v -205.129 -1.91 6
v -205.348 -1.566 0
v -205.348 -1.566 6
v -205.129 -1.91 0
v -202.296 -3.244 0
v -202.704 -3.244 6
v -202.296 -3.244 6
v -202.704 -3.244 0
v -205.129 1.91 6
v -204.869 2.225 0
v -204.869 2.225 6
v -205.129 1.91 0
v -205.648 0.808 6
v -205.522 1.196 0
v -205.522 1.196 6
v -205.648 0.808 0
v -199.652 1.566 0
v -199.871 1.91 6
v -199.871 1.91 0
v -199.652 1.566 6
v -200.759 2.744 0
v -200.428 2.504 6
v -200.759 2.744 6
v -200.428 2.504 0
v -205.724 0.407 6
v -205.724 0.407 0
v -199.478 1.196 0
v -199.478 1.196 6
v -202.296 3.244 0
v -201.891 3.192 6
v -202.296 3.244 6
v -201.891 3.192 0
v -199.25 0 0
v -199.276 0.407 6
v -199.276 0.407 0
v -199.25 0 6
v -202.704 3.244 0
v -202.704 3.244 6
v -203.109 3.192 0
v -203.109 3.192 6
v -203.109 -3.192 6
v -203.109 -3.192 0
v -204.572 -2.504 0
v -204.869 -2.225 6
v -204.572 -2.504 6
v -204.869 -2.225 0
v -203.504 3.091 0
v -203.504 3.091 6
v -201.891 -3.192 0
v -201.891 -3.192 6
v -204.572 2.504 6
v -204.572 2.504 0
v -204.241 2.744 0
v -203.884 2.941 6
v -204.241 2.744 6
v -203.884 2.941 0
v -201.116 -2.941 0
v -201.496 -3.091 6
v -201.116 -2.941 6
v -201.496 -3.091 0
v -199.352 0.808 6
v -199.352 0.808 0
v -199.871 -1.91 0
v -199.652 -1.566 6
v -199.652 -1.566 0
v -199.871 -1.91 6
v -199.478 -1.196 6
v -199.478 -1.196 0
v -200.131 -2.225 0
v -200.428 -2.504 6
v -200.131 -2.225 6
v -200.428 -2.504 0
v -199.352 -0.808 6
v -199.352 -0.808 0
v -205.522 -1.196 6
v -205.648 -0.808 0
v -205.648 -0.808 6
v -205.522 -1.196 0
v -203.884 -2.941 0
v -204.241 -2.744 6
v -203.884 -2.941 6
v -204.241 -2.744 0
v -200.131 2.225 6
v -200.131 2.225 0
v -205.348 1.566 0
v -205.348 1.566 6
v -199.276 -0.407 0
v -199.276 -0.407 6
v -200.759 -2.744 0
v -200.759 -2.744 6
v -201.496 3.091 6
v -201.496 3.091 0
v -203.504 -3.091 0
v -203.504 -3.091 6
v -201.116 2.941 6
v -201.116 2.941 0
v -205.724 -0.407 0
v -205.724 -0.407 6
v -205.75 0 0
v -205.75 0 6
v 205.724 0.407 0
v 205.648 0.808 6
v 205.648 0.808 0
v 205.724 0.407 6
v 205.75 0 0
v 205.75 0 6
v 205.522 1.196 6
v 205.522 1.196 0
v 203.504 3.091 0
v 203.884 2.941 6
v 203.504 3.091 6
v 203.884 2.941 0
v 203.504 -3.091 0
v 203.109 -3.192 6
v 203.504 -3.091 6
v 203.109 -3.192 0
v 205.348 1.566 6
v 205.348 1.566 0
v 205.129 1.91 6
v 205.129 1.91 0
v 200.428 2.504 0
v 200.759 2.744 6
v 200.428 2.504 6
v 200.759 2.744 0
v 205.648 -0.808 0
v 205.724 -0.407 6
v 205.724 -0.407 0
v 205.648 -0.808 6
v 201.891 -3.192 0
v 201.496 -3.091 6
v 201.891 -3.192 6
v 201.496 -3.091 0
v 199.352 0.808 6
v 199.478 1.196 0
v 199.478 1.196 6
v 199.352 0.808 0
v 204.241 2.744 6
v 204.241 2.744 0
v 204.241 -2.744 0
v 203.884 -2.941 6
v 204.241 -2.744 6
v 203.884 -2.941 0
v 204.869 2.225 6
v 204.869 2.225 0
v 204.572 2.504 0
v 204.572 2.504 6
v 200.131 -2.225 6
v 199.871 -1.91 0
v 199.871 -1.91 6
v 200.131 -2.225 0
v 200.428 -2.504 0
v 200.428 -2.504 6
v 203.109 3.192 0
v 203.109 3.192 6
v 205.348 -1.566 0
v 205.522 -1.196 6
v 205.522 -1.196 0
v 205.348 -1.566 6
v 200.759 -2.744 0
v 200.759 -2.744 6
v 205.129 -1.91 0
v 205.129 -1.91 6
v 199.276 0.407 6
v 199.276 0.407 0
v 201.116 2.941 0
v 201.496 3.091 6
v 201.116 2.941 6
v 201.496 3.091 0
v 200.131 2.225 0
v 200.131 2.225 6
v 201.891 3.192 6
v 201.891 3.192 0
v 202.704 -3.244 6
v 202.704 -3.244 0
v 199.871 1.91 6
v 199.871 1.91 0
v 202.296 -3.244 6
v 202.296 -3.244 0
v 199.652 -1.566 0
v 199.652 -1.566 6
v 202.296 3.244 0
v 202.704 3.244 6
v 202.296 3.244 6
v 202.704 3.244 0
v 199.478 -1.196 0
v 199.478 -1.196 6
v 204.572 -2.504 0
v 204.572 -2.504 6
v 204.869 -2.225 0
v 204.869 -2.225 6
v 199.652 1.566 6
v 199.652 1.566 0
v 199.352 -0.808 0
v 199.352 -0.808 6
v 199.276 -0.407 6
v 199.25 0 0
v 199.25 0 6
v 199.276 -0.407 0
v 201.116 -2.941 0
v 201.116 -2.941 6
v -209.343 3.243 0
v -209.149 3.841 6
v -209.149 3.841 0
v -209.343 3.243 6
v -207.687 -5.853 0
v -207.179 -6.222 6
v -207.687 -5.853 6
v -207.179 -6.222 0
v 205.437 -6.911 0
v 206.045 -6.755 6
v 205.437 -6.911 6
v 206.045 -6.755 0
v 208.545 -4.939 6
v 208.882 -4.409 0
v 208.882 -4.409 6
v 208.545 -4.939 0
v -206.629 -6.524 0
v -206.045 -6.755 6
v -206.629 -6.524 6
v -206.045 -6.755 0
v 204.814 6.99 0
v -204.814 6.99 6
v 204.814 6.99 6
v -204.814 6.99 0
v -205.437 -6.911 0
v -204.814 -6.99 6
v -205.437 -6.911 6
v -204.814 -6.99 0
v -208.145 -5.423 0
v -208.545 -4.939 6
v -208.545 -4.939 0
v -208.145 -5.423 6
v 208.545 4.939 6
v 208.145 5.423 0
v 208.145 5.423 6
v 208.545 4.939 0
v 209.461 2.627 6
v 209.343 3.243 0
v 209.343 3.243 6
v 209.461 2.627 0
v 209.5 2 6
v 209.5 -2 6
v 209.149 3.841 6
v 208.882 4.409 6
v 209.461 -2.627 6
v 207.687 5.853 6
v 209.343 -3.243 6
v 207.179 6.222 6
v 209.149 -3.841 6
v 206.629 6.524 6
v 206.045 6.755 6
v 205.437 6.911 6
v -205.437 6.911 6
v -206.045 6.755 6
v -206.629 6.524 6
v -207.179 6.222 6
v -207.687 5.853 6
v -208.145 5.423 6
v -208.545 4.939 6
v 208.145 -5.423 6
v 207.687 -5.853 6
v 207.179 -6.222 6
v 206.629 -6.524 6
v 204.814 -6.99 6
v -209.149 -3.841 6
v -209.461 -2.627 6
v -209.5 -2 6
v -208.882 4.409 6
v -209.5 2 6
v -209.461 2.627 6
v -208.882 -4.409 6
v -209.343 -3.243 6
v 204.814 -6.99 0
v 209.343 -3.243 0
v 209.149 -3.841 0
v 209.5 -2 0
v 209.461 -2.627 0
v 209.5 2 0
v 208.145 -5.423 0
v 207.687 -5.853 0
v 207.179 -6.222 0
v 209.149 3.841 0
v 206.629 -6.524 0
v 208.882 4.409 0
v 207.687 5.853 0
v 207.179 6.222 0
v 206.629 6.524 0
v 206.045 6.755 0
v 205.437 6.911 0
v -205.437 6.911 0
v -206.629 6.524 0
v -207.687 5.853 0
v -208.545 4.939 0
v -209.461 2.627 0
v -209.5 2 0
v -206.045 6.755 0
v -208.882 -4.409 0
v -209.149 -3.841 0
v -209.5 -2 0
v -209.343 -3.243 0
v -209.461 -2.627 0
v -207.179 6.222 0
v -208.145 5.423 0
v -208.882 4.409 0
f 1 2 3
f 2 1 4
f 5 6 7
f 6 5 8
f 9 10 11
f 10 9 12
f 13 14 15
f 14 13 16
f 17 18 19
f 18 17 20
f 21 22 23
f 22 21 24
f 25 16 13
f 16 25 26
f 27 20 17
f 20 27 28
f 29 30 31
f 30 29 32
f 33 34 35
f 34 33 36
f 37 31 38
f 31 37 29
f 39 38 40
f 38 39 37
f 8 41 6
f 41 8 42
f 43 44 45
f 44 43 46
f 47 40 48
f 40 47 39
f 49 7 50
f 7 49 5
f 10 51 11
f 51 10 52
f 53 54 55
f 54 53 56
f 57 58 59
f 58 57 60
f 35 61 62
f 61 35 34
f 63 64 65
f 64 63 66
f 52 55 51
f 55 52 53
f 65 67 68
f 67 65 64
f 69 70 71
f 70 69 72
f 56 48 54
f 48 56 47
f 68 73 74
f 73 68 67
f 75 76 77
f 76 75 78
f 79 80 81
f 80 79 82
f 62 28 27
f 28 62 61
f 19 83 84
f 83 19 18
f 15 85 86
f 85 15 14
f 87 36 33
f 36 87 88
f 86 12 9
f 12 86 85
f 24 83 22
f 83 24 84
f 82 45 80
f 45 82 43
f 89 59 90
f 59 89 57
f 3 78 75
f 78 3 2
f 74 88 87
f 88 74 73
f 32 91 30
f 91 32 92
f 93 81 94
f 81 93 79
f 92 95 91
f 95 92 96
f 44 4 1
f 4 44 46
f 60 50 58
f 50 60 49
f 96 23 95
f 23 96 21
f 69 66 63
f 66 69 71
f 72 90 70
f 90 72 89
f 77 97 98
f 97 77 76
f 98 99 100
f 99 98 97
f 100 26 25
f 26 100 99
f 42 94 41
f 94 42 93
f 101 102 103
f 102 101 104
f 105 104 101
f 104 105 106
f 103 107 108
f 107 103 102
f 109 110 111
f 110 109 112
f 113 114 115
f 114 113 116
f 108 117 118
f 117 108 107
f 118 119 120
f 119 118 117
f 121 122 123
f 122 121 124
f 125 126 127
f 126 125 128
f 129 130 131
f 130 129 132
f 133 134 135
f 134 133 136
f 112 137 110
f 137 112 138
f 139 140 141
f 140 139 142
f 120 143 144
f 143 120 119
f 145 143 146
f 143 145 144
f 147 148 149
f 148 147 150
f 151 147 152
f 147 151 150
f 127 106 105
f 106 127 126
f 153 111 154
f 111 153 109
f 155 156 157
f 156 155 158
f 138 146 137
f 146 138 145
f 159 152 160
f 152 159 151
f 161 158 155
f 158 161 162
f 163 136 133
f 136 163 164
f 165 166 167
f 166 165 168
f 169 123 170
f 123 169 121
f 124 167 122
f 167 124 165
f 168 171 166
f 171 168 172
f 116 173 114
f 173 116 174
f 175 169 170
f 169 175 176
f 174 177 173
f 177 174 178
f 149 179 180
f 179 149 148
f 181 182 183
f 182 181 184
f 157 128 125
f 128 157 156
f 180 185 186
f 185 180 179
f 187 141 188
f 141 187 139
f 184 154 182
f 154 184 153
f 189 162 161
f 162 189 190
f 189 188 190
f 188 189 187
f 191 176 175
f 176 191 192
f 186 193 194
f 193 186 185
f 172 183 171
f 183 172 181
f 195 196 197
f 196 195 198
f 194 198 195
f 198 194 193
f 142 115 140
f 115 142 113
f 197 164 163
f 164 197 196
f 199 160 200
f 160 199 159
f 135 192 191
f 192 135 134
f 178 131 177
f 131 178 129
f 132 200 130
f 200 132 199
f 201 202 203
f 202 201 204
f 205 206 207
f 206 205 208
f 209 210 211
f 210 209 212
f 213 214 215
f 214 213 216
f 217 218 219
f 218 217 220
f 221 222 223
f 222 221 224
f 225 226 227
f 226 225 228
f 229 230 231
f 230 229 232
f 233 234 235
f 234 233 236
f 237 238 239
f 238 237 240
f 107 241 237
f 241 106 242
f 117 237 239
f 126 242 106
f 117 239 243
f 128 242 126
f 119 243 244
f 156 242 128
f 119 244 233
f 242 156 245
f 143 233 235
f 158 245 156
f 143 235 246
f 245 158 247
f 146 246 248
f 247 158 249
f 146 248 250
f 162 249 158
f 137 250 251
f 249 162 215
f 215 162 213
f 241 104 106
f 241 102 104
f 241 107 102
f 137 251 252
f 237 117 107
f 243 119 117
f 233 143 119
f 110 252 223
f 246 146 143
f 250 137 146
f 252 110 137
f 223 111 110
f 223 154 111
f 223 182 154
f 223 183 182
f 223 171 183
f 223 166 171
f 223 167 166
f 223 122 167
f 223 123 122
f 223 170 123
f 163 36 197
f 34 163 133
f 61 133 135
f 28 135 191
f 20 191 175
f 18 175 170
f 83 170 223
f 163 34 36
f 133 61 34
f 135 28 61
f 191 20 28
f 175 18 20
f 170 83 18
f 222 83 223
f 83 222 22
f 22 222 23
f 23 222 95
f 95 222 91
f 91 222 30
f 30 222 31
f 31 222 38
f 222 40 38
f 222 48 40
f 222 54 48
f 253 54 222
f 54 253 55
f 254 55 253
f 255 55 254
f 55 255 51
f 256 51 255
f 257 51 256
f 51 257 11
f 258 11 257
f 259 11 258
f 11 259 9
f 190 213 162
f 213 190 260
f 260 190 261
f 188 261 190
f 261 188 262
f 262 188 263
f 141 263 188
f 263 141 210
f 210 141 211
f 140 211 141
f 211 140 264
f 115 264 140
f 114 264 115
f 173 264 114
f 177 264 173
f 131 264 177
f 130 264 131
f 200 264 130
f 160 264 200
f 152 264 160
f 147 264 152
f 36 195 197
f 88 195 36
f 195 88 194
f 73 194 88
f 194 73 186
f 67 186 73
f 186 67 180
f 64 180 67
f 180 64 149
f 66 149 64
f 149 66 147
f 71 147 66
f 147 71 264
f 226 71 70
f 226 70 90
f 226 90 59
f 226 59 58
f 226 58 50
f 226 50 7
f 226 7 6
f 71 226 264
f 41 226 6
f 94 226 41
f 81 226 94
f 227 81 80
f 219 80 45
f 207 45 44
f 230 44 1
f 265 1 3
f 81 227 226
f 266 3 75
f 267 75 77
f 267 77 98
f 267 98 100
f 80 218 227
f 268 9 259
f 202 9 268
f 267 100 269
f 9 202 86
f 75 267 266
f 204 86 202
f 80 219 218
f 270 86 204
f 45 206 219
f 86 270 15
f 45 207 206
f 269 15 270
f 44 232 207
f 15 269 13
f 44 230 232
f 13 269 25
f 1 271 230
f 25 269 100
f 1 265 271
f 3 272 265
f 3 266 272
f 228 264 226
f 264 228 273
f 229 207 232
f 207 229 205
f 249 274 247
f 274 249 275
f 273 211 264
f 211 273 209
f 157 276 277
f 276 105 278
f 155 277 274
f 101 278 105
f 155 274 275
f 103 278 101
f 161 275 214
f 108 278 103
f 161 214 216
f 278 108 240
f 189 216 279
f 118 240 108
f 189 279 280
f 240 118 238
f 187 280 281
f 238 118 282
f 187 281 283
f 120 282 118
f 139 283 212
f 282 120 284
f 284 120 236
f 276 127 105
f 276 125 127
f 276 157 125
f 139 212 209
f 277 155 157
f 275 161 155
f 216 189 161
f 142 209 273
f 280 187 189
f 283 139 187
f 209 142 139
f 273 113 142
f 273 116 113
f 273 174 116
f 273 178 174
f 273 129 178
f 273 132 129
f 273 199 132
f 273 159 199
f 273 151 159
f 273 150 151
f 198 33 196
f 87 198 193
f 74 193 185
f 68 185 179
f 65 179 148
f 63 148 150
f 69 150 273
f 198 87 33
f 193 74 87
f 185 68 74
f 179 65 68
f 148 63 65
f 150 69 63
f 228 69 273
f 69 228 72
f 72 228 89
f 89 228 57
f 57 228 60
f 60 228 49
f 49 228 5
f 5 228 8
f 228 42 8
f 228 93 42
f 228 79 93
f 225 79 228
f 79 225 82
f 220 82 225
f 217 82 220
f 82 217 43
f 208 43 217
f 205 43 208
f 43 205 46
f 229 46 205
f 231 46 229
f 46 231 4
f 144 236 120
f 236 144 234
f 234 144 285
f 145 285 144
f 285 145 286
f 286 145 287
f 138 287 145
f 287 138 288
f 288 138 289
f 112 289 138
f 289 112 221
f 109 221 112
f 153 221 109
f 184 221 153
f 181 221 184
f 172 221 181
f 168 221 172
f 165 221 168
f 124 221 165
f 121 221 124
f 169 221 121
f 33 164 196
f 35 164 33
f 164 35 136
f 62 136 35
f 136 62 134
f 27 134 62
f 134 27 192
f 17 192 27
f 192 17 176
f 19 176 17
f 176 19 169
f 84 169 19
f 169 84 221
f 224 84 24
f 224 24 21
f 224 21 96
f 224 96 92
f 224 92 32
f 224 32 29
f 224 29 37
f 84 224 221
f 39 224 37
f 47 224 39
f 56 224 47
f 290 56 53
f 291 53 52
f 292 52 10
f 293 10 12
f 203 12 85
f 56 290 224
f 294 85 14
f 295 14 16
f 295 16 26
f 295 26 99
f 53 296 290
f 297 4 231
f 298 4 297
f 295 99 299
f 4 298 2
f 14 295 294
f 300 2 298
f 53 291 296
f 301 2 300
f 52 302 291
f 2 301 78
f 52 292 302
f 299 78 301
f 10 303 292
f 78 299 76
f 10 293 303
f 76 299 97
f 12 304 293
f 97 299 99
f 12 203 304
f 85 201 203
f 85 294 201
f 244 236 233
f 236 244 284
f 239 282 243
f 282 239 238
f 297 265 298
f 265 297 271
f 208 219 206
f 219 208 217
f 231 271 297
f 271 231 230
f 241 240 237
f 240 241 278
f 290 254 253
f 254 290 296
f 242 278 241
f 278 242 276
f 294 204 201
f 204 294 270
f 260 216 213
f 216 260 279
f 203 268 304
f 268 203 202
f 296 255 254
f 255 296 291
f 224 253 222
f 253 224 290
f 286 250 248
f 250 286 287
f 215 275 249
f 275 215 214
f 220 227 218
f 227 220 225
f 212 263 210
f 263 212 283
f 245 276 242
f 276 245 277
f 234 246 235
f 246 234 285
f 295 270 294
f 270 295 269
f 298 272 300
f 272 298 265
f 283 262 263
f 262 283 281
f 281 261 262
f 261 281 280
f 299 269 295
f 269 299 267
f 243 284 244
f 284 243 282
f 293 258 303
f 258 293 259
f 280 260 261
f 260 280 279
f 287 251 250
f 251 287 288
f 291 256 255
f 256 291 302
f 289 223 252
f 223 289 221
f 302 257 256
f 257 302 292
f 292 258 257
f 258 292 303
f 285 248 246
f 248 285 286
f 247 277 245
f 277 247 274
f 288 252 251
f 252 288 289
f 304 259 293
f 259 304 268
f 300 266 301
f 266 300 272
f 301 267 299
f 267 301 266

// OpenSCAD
$fn = 50;


difference() {
	union() {
		hull() {
			translate(v = [-204.5000000000, 2.0000000000, 0]) {
				cylinder(h = 6, r = 5);
			}
			translate(v = [204.5000000000, 2.0000000000, 0]) {
				cylinder(h = 6, r = 5);
			}
			translate(v = [-204.5000000000, -2.0000000000, 0]) {
				cylinder(h = 6, r = 5);
			}
			translate(v = [204.5000000000, -2.0000000000, 0]) {
				cylinder(h = 6, r = 5);
			}
		}
	}
	union() {
		translate(v = [-202.5000000000, 0.0000000000, -100.0000000000]) {
			cylinder(h = 200, r = 3.2500000000);
		}
		translate(v = [-202.5000000000, 0.0000000000, -100.0000000000]) {
			cylinder(h = 200, r = 3.2500000000);
		}
		translate(v = [202.5000000000, 0.0000000000, -100.0000000000]) {
			cylinder(h = 200, r = 3.2500000000);
		}
		translate(v = [202.5000000000, 0.0000000000, -100.0000000000]) {
			cylinder(h = 200, r = 3.2500000000);
		}
	}
}
